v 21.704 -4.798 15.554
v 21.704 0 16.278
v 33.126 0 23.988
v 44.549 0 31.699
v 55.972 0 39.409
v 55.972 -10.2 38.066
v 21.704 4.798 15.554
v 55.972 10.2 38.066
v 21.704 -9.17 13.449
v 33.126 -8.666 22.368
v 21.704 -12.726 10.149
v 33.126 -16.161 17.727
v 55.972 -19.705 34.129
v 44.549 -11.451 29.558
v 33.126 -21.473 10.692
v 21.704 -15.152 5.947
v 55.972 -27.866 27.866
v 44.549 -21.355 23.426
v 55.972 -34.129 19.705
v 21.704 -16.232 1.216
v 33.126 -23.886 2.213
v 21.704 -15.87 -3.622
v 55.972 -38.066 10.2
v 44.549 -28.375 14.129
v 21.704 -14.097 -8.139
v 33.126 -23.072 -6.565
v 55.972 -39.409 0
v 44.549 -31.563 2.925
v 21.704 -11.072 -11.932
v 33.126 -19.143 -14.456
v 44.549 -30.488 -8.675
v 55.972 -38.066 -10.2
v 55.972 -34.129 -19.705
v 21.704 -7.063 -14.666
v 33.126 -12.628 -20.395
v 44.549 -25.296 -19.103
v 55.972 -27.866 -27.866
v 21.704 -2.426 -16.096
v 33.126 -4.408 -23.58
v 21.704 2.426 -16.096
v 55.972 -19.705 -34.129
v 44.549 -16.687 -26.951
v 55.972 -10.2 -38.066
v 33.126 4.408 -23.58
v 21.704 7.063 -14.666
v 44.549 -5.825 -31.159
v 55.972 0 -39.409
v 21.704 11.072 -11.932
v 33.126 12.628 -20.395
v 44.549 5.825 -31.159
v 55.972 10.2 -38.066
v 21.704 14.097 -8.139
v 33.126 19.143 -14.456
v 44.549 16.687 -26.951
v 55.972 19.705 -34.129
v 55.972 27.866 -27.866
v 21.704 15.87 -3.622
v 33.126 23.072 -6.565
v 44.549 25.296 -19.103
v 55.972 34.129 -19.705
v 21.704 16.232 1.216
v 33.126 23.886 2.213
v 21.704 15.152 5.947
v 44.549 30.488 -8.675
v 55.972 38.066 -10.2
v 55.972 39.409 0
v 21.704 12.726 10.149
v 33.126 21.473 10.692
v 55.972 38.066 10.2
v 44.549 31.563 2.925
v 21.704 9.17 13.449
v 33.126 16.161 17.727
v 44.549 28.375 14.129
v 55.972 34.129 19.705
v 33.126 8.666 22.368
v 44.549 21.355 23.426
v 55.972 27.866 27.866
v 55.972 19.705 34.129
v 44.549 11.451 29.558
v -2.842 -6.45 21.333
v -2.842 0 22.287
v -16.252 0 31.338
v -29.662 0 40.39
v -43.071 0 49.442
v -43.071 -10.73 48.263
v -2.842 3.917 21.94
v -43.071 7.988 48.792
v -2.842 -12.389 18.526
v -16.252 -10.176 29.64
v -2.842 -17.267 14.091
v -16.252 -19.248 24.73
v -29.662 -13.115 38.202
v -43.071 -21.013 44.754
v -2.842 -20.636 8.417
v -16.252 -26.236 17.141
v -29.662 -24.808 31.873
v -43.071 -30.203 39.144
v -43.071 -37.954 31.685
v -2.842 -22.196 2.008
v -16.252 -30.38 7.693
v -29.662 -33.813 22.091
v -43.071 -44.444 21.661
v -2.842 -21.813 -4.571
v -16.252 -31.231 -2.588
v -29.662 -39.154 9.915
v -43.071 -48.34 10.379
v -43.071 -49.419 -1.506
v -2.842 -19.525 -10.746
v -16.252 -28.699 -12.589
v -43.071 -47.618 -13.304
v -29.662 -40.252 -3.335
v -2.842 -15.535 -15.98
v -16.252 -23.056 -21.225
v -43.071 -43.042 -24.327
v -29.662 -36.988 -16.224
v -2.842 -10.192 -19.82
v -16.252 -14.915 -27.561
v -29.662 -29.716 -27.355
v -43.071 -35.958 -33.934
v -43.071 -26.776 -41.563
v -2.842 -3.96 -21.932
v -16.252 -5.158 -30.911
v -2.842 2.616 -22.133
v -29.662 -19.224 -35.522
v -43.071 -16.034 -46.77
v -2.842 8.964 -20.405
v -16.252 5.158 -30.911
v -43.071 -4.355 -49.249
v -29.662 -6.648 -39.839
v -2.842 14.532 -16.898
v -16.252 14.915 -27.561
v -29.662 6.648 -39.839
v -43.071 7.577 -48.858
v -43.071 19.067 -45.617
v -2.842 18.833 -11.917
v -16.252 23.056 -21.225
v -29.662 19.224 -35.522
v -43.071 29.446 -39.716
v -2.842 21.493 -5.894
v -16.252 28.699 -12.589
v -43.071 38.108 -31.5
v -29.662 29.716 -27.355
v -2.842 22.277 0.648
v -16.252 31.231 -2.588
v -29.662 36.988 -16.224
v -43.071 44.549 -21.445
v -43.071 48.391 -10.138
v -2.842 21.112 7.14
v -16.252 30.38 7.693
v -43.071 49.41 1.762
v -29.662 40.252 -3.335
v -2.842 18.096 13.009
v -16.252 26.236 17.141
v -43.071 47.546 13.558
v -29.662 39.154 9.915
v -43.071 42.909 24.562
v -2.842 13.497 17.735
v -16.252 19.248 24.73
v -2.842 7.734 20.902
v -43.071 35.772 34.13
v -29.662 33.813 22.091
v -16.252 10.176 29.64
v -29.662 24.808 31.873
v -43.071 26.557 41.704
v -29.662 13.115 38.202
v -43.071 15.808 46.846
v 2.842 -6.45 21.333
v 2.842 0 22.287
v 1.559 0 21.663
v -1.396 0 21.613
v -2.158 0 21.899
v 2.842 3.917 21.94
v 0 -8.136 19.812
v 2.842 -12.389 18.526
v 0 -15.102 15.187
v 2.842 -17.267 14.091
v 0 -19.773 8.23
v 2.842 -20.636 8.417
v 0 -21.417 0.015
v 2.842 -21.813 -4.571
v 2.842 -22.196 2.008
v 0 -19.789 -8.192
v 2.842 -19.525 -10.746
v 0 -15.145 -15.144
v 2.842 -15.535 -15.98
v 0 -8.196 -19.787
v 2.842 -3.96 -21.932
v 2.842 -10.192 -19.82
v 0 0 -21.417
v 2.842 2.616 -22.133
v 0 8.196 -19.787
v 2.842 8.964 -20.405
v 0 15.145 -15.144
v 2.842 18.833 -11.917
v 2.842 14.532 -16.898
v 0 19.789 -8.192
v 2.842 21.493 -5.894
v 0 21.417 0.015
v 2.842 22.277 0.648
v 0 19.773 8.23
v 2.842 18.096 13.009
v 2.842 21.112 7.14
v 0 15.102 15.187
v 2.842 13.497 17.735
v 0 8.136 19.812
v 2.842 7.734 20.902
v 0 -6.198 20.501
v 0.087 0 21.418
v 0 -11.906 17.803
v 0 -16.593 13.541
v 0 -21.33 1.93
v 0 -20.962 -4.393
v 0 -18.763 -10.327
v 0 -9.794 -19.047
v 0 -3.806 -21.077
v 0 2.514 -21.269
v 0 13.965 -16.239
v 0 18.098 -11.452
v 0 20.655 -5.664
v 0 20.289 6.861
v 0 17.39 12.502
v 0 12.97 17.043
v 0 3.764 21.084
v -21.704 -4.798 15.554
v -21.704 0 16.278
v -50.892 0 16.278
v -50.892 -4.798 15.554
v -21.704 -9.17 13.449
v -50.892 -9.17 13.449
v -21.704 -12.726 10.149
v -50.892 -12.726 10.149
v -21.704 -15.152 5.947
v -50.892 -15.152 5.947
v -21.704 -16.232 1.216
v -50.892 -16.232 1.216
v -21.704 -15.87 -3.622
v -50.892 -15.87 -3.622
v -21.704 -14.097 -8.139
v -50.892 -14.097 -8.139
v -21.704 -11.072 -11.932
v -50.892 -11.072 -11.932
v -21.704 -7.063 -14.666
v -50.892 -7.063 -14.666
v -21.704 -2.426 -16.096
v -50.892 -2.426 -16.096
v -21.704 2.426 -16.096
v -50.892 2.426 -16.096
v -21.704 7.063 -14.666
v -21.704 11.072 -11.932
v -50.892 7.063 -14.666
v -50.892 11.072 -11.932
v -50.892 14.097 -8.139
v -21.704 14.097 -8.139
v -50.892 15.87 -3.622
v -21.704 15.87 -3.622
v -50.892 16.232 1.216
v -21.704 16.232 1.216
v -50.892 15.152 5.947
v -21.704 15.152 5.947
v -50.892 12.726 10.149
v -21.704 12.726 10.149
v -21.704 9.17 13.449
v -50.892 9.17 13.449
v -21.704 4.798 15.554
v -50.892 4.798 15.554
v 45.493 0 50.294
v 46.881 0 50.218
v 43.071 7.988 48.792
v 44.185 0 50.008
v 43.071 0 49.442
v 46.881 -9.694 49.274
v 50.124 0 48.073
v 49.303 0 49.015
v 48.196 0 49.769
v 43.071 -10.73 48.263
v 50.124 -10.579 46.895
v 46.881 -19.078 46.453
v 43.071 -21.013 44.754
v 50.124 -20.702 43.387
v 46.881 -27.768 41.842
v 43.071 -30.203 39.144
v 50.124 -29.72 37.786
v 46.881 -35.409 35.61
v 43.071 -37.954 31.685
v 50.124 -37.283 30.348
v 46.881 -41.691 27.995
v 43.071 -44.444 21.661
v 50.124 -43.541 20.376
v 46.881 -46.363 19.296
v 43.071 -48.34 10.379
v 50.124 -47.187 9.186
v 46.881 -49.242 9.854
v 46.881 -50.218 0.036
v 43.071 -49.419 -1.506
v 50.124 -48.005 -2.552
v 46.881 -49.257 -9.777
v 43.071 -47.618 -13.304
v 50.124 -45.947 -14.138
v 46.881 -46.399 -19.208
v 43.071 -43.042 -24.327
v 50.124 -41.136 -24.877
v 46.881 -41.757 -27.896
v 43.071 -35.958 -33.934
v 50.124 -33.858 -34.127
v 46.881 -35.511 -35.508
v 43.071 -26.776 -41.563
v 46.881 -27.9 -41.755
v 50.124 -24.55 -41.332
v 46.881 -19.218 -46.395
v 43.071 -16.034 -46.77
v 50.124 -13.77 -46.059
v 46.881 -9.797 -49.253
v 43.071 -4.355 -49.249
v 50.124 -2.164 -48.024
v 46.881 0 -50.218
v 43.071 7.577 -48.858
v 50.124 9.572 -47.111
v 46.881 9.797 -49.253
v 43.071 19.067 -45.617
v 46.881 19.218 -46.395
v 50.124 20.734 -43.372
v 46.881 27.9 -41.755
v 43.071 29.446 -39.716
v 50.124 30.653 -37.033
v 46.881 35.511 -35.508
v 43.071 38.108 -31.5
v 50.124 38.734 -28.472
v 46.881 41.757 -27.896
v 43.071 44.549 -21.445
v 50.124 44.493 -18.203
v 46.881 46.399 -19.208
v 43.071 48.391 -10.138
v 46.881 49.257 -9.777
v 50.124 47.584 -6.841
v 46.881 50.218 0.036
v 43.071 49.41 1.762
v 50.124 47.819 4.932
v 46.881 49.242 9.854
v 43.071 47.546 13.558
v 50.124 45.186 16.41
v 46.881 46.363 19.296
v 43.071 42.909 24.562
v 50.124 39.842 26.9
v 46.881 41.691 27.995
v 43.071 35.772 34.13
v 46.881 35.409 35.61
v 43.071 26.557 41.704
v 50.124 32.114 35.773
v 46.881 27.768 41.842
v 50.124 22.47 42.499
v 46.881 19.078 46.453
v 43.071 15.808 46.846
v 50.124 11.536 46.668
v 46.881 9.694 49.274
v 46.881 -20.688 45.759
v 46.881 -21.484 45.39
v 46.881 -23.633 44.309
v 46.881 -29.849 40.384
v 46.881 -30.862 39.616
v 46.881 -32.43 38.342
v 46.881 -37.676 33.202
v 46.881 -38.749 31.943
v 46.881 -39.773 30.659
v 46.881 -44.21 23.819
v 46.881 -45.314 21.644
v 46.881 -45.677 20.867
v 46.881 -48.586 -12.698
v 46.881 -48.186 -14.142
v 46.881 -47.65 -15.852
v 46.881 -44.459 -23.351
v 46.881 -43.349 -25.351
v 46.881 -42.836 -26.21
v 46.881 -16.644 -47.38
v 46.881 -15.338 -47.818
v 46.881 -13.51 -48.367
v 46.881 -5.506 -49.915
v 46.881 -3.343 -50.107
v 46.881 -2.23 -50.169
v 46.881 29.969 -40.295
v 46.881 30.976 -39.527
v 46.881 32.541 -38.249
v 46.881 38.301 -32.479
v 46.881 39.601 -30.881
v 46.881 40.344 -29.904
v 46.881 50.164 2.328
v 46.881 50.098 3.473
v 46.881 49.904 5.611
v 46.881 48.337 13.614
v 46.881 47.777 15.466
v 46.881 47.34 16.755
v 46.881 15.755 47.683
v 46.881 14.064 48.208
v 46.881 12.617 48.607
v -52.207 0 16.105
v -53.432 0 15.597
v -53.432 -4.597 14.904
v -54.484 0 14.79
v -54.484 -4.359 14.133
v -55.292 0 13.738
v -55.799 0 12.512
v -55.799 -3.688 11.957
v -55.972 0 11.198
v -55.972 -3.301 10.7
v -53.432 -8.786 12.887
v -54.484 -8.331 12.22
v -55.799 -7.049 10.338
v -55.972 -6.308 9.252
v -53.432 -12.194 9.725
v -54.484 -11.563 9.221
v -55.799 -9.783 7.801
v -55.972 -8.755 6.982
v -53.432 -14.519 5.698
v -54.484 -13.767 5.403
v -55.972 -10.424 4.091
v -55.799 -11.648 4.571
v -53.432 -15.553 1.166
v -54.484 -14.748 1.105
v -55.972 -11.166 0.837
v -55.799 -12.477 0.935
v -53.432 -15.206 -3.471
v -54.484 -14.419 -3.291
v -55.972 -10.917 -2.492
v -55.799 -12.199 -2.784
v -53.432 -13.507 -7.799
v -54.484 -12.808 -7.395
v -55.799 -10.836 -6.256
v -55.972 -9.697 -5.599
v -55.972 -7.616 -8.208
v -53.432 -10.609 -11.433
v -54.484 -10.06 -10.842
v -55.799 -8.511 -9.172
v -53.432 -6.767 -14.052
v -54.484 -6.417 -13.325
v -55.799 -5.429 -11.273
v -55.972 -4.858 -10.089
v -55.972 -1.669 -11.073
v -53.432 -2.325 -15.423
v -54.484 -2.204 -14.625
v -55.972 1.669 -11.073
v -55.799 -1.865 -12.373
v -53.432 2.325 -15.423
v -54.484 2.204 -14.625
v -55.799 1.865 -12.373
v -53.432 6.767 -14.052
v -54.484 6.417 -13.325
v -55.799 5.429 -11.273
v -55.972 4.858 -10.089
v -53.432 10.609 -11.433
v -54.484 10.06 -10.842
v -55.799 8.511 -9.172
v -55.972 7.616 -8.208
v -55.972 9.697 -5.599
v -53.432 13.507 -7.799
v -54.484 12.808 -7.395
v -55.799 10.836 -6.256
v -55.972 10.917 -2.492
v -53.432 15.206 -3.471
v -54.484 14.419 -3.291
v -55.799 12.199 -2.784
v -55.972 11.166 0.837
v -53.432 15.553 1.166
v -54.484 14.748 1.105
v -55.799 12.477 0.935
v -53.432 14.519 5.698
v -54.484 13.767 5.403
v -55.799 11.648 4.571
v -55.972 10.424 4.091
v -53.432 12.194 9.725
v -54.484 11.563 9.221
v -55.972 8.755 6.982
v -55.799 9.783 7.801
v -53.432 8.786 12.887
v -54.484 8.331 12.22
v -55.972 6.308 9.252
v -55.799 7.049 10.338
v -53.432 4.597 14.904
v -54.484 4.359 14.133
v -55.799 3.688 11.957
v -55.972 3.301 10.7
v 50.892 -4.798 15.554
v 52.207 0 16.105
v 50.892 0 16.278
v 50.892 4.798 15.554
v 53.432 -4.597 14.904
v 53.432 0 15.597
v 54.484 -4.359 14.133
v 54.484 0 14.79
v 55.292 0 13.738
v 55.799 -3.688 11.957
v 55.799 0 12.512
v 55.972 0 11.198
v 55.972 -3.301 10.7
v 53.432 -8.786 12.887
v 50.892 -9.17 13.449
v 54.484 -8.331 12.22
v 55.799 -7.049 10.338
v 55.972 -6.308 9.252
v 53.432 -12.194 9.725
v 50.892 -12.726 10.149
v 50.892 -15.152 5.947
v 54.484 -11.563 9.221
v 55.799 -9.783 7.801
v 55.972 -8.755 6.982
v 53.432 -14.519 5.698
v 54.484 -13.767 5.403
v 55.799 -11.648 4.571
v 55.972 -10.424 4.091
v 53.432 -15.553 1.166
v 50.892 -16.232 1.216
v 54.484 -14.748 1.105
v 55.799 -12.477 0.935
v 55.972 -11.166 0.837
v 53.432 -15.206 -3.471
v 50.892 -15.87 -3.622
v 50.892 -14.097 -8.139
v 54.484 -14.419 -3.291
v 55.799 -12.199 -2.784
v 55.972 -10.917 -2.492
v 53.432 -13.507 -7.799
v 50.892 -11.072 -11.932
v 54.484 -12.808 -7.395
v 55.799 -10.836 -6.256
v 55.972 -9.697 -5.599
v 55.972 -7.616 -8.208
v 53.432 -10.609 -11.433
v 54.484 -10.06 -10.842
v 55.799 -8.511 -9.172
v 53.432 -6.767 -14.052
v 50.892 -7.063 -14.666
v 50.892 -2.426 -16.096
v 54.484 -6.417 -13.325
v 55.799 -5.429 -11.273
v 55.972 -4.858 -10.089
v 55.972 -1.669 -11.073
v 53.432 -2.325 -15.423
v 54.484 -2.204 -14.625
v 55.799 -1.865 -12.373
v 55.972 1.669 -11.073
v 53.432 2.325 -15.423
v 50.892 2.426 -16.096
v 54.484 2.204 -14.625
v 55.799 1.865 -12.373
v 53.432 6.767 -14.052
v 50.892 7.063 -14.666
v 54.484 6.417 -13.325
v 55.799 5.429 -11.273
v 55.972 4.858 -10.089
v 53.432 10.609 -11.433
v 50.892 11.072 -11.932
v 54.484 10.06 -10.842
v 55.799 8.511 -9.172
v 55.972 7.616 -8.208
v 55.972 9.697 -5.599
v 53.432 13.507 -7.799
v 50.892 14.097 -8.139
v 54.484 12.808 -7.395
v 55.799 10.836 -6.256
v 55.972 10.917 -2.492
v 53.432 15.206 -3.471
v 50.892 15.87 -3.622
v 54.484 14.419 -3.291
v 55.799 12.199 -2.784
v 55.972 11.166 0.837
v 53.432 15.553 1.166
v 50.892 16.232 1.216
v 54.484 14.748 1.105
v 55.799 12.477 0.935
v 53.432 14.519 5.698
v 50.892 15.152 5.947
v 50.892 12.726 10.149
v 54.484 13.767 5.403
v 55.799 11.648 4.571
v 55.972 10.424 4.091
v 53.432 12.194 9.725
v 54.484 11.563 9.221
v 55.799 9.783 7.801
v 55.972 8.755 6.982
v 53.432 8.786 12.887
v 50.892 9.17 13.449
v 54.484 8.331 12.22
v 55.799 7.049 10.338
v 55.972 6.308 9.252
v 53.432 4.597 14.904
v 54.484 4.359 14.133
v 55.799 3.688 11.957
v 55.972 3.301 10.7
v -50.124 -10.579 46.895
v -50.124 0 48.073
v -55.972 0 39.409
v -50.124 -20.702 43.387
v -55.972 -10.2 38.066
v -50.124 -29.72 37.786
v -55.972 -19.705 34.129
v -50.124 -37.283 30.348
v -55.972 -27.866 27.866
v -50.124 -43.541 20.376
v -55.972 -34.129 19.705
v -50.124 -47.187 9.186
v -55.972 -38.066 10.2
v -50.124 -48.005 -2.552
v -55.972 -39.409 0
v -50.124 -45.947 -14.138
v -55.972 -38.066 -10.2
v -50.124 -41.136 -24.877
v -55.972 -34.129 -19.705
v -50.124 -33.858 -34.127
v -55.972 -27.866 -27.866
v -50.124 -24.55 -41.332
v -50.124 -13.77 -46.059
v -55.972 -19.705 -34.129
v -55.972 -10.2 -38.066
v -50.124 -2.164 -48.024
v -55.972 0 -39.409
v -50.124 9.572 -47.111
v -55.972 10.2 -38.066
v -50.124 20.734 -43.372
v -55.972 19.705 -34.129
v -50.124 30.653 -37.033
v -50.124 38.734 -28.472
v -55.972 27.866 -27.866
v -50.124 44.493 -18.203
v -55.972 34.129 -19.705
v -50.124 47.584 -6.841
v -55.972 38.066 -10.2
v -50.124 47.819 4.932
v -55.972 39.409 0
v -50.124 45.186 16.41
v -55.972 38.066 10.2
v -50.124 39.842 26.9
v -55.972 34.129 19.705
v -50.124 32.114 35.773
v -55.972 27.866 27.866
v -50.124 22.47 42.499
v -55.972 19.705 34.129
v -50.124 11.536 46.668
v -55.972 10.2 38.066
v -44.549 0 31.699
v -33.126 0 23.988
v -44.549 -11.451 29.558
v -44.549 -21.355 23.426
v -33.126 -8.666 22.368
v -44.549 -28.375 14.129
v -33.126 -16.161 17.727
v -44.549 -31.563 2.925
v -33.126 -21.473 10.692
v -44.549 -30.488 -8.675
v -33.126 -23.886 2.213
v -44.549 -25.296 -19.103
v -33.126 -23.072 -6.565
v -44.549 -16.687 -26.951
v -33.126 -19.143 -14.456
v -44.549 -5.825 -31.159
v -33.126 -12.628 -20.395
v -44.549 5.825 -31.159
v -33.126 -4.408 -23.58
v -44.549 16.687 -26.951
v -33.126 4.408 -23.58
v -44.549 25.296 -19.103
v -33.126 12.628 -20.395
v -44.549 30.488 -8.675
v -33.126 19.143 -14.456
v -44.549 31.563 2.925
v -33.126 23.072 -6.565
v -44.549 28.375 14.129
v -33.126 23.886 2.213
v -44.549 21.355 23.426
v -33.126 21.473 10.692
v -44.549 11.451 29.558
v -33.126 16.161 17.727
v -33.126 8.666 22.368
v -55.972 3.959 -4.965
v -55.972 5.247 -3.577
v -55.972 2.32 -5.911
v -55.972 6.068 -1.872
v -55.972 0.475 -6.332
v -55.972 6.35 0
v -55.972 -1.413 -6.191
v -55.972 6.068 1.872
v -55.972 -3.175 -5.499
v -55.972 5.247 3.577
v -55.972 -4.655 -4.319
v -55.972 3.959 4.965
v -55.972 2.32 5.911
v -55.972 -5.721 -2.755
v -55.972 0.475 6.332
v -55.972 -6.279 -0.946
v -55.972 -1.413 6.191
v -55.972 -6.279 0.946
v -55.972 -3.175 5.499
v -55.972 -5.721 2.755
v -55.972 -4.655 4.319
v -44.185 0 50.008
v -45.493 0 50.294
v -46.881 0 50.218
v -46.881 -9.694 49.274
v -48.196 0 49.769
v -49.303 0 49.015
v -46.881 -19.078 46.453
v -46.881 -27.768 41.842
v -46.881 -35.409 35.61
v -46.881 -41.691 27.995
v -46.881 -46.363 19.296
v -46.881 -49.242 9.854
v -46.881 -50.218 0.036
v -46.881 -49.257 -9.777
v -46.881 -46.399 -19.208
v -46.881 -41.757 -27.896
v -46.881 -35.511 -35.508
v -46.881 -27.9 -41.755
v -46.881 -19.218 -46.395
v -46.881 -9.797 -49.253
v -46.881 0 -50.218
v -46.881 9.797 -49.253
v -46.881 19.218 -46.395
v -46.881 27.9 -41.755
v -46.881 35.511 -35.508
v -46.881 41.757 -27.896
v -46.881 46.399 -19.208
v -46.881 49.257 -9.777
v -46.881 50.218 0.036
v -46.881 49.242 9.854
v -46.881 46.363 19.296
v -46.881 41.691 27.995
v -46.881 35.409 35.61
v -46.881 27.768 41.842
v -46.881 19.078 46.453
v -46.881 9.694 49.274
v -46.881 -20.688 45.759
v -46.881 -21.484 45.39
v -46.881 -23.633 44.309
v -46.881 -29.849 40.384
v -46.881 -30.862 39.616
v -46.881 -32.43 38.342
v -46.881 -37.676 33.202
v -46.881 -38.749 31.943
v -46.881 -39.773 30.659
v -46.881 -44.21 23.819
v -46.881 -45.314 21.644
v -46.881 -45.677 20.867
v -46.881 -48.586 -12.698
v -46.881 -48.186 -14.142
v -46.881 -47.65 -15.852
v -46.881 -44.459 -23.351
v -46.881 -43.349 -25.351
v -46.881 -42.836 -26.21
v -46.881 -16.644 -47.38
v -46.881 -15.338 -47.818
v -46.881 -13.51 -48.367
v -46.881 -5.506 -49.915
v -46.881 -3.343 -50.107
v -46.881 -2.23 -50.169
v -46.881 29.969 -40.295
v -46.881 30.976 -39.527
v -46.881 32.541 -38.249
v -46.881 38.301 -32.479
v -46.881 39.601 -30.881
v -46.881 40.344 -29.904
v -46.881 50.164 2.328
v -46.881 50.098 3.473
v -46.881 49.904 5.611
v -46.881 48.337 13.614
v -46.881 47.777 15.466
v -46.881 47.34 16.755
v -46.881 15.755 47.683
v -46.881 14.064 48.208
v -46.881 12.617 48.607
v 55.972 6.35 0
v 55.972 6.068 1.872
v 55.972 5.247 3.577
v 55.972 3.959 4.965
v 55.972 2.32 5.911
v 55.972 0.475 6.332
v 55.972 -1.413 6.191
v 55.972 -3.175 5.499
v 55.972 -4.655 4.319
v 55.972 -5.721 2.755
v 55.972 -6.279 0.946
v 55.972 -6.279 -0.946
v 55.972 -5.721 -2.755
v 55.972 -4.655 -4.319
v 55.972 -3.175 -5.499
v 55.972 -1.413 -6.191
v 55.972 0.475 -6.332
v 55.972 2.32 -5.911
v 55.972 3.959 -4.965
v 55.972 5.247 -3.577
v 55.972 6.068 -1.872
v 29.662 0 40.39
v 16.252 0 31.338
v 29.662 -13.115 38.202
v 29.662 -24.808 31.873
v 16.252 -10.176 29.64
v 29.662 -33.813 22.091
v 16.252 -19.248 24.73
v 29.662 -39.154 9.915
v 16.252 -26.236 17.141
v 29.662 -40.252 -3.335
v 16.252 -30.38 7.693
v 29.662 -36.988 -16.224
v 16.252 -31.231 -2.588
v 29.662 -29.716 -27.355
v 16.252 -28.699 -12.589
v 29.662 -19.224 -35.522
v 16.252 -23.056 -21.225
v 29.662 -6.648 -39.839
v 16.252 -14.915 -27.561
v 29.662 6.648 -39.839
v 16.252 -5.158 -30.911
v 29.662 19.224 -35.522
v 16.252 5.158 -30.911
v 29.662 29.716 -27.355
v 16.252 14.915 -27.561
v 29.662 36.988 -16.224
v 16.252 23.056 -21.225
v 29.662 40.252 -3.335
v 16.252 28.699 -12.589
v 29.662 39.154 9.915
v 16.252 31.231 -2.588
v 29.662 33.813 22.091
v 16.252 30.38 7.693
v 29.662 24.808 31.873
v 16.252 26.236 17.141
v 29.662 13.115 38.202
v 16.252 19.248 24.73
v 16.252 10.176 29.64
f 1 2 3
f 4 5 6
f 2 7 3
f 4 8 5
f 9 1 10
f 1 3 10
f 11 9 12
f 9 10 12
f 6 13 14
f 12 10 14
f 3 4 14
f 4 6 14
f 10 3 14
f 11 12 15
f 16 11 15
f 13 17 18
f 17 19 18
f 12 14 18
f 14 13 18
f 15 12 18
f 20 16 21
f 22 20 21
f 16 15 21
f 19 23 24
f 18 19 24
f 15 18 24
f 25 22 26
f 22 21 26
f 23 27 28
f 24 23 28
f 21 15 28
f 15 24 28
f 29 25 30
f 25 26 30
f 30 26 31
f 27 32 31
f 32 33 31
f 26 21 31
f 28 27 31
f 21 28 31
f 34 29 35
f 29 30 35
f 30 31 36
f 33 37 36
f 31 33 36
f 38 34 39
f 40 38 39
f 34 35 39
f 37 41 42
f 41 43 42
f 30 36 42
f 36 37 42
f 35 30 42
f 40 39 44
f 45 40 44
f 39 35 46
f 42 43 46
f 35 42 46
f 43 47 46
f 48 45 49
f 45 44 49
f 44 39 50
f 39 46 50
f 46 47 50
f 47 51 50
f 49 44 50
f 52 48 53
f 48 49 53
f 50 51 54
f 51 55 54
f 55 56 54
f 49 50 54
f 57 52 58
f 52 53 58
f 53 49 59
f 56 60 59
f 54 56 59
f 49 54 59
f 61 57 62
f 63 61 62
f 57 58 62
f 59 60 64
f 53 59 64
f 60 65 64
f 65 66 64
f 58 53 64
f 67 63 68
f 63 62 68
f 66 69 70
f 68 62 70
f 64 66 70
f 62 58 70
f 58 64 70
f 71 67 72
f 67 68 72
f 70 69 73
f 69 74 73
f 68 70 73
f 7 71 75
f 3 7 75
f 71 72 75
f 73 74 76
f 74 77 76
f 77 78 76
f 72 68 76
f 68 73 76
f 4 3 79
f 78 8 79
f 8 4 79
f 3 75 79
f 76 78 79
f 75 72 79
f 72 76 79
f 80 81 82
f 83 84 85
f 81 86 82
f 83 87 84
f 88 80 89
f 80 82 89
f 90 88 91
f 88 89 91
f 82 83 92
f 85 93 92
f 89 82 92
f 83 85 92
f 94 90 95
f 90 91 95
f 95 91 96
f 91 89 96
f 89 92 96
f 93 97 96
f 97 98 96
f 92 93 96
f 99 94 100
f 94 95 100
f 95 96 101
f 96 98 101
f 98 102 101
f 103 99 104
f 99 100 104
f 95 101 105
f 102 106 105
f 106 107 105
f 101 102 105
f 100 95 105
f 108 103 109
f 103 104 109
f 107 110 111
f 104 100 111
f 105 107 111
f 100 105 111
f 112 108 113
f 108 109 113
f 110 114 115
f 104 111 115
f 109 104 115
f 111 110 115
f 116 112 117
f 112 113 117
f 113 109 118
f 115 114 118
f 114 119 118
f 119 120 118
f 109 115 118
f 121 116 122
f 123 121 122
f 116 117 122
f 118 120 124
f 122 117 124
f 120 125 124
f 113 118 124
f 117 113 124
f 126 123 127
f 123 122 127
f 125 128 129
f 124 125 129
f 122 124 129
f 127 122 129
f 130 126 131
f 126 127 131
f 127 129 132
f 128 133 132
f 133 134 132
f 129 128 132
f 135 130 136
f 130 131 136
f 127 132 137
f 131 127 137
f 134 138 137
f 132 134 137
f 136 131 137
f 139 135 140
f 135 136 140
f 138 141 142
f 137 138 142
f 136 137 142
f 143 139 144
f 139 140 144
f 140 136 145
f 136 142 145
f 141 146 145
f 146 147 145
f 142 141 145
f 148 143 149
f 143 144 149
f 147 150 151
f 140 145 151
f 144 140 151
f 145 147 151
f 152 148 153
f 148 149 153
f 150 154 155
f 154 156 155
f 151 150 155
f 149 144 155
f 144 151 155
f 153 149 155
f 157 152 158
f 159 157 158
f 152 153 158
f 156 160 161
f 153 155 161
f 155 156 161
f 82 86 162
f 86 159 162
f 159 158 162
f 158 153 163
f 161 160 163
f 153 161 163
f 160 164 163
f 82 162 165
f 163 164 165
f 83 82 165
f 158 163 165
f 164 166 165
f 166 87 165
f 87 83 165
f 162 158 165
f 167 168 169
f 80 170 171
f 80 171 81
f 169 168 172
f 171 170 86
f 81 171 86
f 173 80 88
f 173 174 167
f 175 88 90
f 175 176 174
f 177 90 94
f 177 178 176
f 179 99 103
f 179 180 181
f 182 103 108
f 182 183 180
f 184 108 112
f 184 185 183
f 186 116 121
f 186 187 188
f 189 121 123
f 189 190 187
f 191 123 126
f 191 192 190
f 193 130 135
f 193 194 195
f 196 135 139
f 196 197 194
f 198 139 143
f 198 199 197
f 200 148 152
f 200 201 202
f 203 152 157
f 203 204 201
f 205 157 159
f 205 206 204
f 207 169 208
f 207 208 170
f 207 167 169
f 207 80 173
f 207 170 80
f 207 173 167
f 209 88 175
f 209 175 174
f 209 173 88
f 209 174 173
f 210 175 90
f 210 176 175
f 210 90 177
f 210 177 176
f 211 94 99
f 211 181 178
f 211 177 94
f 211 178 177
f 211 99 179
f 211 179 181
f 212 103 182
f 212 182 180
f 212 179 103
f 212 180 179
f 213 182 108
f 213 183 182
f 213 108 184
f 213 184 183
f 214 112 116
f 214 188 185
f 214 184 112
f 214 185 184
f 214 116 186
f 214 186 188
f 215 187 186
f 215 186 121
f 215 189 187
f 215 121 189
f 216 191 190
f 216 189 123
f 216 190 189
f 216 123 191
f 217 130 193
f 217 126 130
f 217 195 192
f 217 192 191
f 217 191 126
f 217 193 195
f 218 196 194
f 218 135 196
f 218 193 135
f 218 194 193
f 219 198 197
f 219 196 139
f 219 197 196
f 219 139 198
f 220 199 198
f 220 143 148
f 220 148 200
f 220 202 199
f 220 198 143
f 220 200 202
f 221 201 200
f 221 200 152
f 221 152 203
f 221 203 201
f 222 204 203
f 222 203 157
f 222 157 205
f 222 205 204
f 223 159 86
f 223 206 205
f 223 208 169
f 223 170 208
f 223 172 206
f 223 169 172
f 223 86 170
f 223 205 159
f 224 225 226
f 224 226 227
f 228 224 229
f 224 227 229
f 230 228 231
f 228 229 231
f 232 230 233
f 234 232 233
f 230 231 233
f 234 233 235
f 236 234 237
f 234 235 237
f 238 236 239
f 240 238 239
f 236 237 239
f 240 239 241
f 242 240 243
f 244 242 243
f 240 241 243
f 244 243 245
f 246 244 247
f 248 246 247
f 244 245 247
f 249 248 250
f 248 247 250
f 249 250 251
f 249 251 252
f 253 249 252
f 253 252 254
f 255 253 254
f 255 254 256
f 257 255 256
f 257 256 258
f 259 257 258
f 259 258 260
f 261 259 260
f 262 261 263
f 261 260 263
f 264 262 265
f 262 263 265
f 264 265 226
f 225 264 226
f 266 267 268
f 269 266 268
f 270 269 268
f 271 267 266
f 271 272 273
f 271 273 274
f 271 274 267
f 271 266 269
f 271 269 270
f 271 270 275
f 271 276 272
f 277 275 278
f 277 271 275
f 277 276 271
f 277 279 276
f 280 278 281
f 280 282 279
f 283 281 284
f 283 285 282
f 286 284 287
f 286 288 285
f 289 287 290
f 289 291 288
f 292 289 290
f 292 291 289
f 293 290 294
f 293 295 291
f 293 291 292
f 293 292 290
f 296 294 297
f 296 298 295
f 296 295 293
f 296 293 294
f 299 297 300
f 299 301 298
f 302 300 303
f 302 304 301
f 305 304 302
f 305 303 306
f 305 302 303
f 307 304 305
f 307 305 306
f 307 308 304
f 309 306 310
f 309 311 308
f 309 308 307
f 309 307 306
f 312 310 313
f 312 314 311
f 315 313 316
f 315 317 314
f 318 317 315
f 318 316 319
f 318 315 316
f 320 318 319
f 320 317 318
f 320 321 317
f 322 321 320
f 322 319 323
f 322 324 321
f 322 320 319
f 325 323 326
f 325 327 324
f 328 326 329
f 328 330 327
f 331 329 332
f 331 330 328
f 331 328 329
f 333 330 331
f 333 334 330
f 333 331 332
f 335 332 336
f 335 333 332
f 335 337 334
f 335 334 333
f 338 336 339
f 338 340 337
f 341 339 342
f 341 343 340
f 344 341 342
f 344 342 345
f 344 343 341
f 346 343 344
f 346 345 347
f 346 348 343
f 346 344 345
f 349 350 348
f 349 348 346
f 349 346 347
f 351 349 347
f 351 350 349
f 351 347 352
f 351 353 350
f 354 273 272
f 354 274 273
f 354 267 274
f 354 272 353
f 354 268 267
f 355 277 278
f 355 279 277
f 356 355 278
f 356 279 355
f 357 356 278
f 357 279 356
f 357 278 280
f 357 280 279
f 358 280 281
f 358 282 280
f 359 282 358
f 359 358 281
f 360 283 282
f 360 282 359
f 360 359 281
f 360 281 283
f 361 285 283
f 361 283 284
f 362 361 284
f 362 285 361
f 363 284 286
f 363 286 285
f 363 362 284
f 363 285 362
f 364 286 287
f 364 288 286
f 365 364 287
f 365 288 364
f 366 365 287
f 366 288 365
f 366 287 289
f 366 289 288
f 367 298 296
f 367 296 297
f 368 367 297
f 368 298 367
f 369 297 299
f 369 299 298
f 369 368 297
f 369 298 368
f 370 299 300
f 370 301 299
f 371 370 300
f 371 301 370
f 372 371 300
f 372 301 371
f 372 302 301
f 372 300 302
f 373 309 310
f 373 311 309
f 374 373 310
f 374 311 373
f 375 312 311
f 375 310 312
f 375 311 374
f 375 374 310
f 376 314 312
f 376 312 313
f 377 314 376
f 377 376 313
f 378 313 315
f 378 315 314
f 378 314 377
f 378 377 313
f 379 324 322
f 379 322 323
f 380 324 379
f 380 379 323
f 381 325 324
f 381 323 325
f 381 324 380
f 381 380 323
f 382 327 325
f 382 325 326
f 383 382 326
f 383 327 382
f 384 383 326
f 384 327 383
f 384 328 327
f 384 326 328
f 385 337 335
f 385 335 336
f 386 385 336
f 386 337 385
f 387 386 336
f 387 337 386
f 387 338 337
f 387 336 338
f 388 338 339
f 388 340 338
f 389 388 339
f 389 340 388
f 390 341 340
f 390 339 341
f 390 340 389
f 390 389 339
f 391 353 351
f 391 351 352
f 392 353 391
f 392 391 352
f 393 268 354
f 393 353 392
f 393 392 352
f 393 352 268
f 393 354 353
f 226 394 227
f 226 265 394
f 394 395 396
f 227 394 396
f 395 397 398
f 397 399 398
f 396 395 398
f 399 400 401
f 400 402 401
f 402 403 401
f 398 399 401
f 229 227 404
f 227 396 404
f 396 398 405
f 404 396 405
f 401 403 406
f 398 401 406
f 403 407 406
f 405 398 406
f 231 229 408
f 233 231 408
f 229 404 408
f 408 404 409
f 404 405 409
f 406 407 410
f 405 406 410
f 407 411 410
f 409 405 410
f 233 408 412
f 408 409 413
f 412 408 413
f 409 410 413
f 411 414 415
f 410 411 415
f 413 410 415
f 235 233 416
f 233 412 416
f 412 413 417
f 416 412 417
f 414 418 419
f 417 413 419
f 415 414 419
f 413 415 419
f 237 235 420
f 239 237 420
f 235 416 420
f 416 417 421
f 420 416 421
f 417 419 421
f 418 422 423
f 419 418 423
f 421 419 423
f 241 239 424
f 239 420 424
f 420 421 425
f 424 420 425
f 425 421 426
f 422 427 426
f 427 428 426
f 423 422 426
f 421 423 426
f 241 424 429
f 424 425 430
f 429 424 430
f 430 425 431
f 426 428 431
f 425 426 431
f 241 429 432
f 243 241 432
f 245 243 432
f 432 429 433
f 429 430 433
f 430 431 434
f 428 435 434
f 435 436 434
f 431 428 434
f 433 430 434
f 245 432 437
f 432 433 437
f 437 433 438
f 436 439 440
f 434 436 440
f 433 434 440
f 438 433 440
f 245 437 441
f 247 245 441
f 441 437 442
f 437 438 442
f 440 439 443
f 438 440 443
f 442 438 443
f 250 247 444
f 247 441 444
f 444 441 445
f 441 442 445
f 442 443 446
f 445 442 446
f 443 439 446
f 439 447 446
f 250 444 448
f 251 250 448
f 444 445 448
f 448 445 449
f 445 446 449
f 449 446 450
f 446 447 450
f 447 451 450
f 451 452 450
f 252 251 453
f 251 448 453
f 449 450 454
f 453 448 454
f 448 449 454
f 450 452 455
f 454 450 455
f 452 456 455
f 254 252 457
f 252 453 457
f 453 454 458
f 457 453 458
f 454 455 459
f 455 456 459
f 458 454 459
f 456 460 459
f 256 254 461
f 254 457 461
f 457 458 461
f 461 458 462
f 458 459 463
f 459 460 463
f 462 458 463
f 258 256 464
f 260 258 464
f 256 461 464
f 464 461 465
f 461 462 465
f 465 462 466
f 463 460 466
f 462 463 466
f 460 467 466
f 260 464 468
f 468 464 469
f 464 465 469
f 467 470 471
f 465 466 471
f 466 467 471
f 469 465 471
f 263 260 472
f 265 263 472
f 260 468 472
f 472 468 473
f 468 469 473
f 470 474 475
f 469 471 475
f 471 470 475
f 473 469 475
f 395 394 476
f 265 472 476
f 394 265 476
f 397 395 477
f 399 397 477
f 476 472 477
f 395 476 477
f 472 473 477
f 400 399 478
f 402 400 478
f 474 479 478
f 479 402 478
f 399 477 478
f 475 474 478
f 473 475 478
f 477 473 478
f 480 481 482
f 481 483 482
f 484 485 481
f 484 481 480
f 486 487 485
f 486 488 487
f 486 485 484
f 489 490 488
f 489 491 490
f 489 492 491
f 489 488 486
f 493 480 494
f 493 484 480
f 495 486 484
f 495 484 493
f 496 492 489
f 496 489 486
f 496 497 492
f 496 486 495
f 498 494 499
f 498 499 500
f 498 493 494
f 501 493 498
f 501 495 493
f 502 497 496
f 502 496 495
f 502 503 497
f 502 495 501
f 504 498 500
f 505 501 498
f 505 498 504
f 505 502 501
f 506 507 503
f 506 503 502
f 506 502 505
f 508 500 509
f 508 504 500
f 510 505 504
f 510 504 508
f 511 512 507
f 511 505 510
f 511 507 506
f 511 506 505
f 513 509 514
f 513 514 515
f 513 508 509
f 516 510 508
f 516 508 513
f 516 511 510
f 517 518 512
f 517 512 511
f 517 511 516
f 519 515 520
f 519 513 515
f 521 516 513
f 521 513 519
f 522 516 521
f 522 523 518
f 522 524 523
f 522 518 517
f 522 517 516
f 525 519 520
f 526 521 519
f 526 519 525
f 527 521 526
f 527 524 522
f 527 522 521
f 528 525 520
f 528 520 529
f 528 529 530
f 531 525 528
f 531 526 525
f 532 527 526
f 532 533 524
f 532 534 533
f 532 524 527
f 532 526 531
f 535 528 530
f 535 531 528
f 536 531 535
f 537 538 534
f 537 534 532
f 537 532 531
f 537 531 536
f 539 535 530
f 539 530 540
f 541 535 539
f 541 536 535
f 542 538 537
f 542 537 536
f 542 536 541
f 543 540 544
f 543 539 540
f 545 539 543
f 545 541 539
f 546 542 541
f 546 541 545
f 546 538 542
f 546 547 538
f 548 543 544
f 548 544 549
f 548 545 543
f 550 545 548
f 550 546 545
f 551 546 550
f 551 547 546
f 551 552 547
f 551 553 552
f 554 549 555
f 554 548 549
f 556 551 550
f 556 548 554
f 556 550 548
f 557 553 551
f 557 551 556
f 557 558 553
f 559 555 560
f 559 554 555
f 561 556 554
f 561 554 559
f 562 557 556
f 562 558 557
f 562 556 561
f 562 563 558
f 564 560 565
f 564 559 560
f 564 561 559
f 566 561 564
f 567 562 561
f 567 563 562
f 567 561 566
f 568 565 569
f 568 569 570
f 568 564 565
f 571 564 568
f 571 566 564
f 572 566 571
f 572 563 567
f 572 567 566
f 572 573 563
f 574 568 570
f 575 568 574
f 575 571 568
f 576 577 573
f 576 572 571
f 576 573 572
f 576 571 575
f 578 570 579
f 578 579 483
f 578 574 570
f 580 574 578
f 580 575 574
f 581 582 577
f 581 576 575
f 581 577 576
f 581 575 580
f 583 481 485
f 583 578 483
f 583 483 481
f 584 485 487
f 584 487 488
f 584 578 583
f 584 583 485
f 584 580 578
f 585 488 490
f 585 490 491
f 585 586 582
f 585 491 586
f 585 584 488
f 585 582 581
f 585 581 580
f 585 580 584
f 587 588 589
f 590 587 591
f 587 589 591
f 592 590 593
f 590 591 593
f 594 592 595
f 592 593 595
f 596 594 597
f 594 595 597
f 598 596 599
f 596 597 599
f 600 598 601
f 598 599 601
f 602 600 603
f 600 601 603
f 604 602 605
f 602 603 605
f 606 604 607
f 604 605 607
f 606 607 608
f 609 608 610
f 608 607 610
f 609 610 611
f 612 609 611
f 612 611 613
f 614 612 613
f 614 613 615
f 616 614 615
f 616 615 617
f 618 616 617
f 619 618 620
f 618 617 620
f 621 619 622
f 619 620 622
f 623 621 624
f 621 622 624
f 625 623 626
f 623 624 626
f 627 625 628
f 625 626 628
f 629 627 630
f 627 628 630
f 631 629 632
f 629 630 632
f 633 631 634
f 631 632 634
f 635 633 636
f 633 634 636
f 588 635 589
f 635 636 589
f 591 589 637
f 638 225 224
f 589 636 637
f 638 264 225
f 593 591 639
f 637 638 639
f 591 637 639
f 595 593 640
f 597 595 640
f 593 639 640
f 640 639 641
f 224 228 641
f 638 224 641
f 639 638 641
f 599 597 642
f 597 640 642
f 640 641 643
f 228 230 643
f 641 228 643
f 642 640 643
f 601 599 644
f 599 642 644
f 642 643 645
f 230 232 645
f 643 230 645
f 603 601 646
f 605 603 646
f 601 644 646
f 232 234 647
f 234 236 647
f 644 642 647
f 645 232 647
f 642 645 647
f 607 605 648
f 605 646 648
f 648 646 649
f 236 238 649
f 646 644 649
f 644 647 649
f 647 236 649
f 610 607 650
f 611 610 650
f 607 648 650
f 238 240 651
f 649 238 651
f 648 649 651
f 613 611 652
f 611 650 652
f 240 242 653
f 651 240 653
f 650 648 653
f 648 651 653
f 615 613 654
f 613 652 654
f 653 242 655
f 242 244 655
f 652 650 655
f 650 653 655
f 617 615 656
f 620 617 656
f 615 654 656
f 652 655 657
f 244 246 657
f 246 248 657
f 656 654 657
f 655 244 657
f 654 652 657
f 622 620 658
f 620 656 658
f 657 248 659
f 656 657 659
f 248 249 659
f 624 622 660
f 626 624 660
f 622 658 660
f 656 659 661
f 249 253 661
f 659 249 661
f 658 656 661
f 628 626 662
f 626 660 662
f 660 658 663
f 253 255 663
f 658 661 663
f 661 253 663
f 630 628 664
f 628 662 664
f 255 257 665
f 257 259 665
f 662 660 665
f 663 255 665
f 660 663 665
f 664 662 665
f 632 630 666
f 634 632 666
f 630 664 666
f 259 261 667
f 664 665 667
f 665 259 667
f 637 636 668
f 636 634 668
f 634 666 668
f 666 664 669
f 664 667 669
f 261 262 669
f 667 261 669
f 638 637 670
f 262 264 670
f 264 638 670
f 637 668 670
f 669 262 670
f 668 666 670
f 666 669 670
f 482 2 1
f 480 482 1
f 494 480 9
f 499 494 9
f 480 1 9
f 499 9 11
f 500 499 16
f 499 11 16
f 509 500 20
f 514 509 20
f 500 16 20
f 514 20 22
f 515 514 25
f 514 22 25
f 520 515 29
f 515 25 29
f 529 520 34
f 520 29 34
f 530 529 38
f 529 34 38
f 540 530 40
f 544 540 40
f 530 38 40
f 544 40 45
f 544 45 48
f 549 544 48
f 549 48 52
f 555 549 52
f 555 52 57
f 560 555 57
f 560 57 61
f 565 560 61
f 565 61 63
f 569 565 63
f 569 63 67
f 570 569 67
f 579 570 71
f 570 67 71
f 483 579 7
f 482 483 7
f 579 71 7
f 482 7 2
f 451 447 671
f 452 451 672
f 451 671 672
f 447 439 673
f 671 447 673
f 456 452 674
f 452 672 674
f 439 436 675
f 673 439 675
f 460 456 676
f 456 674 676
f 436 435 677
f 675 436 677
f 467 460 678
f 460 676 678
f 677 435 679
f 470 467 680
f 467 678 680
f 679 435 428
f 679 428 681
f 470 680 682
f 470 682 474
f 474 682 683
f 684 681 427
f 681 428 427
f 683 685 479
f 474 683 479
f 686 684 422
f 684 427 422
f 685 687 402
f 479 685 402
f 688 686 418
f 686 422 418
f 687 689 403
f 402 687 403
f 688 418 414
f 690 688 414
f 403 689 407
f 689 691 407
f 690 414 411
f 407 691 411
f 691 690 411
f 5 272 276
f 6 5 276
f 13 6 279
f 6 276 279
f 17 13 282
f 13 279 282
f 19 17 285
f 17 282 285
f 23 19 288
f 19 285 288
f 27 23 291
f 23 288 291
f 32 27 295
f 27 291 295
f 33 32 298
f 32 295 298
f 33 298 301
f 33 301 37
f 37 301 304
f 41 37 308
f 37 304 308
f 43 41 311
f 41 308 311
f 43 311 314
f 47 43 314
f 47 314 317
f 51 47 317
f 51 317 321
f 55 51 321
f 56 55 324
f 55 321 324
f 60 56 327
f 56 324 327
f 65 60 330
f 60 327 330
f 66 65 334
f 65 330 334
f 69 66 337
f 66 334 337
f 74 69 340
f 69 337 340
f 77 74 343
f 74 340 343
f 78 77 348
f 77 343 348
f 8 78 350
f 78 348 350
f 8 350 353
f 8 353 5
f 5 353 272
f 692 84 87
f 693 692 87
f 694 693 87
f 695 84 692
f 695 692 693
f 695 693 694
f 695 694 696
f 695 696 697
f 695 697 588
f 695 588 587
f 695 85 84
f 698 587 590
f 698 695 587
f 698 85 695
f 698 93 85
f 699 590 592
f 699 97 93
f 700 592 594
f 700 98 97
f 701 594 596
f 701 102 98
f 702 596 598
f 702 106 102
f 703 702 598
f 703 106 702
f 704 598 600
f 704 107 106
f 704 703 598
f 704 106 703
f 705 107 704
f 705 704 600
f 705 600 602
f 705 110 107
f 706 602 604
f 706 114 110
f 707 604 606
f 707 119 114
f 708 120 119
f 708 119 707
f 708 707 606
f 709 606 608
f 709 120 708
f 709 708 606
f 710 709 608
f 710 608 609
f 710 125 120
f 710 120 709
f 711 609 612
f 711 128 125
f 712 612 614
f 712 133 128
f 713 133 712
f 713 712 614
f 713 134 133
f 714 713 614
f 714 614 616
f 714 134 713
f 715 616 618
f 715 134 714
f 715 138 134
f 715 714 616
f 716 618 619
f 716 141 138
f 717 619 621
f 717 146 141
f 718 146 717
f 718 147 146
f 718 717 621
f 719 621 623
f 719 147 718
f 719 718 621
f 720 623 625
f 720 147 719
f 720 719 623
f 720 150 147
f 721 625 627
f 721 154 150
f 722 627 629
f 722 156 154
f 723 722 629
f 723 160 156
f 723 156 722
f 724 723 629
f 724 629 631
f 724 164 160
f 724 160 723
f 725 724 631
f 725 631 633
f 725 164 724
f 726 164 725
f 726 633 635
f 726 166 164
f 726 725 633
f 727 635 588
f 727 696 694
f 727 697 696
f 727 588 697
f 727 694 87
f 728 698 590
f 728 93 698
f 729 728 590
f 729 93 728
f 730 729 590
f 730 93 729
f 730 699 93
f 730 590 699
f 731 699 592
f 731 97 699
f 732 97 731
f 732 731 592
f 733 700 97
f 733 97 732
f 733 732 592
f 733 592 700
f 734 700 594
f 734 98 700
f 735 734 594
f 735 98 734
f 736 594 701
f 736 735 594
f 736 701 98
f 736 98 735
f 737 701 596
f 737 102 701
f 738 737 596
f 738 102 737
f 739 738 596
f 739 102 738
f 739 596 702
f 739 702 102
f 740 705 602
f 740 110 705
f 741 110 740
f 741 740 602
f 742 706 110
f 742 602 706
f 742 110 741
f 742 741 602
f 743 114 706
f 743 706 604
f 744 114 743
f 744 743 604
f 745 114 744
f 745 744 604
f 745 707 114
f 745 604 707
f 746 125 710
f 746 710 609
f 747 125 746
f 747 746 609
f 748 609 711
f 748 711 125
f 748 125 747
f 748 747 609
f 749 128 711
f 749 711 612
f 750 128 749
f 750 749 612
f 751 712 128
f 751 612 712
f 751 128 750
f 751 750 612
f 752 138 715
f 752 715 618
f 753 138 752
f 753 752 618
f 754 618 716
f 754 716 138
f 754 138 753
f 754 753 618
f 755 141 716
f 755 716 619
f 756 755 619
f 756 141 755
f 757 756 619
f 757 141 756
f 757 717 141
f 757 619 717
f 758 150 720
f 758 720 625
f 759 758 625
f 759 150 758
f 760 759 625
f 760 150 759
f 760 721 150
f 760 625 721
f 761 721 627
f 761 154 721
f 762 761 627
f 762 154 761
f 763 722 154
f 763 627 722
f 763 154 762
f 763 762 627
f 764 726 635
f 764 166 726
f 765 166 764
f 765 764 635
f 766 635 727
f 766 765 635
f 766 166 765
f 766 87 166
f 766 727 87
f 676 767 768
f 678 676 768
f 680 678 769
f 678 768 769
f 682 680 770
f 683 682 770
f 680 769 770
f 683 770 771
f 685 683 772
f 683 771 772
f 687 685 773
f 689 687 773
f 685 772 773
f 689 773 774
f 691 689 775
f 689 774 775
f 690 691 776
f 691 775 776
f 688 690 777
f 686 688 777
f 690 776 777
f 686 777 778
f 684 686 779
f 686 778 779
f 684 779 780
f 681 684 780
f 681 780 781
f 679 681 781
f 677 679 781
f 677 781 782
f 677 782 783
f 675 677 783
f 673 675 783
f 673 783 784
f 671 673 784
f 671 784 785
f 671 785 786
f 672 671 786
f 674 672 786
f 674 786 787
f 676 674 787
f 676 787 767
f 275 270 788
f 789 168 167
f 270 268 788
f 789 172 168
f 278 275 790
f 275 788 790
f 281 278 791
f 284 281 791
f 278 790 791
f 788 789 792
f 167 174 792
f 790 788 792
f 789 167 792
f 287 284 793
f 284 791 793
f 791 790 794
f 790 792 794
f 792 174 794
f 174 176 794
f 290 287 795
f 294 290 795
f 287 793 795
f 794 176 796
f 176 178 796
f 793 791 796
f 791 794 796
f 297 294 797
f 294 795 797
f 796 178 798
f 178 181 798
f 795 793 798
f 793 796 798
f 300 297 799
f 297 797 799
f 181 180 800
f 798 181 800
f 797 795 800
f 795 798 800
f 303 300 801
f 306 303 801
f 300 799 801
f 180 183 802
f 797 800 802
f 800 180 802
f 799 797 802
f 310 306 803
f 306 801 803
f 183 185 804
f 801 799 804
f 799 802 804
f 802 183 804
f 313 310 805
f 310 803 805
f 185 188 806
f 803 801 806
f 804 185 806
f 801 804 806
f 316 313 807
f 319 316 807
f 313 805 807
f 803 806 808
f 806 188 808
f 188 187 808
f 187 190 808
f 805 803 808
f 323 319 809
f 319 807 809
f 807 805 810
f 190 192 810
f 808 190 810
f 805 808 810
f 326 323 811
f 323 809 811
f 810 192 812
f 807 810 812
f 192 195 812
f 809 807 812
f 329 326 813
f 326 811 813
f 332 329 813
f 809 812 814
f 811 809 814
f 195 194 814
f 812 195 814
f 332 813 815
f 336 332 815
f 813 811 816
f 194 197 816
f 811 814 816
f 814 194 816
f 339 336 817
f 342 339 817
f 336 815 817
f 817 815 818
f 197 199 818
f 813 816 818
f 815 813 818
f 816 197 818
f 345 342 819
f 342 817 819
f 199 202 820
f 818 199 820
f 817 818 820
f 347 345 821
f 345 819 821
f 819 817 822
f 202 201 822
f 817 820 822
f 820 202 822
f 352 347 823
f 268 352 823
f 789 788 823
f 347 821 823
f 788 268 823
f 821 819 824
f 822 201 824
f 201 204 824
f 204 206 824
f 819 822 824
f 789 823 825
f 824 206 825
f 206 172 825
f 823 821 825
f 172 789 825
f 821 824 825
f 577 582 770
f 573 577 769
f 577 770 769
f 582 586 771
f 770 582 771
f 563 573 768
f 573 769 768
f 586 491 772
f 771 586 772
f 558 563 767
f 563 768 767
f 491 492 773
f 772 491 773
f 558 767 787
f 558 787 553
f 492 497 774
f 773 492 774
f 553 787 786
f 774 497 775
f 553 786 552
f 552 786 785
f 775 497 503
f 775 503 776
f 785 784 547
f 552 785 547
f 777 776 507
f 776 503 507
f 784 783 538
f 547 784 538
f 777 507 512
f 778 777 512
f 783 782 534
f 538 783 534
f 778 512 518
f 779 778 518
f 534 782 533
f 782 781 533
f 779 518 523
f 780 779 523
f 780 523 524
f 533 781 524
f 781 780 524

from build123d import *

# Parameters (mm, degrees)
F2_R     = 5.08
F3_R     = 5.08
F4_R     = 5.08
F5_R     = 5.08
F6_R     = 6.35
F7_DEPTH = 111.945489


with BuildPart() as f1:
    # F0 (on Front) → F1 (revolve)
    with BuildSketch(Plane.XZ):
        Polygon((-55.972245, 0), (0, 0), (55.972245, 0), (55.972245, 16.277639), (21.703525, 16.277639), (55.972245, 39.409027), (47.281835, 52.283707), (0, 20.368467), (-47.281835, 52.283707), (-55.972245, 39.409027), (-21.703525, 16.277639), (-55.972245, 16.277639), align=None)
    revolve(axis=Axis((27.986122, 0, 0), (1, 0, 0)))

    # F2
    f2_edges = [f1.edges().sort_by_distance(p)[0] for p in [
        (-55.972245, 0, -16.277639),
    ]]
    fillet(f2_edges, radius=F2_R)

    # F3
    f3_edges = [f1.edges().sort_by_distance(p)[0] for p in [
        (55.972245, 0, -16.277639),
    ]]
    fillet(f3_edges, radius=F3_R)

    # F4
    f4_edges = [f1.edges().sort_by_distance(p)[0] for p in [
        (-47.281835, 0, -52.283707),
        (47.281835, 0, -52.283707),
    ]]
    fillet(f4_edges, radius=F4_R)

    # F5
    f5_edges = [f1.edges().sort_by_distance(p)[0] for p in [
        (0, 0, -20.368467),
    ]]
    fillet(f5_edges, radius=F5_R)

    # F6 (on face) → F7 (cut, through all)
    with BuildSketch(Plane.YZ.offset(55.972245)):
        Circle(F6_R)
    extrude(amount=-F7_DEPTH, mode=Mode.SUBTRACT)


solid = f1.part
